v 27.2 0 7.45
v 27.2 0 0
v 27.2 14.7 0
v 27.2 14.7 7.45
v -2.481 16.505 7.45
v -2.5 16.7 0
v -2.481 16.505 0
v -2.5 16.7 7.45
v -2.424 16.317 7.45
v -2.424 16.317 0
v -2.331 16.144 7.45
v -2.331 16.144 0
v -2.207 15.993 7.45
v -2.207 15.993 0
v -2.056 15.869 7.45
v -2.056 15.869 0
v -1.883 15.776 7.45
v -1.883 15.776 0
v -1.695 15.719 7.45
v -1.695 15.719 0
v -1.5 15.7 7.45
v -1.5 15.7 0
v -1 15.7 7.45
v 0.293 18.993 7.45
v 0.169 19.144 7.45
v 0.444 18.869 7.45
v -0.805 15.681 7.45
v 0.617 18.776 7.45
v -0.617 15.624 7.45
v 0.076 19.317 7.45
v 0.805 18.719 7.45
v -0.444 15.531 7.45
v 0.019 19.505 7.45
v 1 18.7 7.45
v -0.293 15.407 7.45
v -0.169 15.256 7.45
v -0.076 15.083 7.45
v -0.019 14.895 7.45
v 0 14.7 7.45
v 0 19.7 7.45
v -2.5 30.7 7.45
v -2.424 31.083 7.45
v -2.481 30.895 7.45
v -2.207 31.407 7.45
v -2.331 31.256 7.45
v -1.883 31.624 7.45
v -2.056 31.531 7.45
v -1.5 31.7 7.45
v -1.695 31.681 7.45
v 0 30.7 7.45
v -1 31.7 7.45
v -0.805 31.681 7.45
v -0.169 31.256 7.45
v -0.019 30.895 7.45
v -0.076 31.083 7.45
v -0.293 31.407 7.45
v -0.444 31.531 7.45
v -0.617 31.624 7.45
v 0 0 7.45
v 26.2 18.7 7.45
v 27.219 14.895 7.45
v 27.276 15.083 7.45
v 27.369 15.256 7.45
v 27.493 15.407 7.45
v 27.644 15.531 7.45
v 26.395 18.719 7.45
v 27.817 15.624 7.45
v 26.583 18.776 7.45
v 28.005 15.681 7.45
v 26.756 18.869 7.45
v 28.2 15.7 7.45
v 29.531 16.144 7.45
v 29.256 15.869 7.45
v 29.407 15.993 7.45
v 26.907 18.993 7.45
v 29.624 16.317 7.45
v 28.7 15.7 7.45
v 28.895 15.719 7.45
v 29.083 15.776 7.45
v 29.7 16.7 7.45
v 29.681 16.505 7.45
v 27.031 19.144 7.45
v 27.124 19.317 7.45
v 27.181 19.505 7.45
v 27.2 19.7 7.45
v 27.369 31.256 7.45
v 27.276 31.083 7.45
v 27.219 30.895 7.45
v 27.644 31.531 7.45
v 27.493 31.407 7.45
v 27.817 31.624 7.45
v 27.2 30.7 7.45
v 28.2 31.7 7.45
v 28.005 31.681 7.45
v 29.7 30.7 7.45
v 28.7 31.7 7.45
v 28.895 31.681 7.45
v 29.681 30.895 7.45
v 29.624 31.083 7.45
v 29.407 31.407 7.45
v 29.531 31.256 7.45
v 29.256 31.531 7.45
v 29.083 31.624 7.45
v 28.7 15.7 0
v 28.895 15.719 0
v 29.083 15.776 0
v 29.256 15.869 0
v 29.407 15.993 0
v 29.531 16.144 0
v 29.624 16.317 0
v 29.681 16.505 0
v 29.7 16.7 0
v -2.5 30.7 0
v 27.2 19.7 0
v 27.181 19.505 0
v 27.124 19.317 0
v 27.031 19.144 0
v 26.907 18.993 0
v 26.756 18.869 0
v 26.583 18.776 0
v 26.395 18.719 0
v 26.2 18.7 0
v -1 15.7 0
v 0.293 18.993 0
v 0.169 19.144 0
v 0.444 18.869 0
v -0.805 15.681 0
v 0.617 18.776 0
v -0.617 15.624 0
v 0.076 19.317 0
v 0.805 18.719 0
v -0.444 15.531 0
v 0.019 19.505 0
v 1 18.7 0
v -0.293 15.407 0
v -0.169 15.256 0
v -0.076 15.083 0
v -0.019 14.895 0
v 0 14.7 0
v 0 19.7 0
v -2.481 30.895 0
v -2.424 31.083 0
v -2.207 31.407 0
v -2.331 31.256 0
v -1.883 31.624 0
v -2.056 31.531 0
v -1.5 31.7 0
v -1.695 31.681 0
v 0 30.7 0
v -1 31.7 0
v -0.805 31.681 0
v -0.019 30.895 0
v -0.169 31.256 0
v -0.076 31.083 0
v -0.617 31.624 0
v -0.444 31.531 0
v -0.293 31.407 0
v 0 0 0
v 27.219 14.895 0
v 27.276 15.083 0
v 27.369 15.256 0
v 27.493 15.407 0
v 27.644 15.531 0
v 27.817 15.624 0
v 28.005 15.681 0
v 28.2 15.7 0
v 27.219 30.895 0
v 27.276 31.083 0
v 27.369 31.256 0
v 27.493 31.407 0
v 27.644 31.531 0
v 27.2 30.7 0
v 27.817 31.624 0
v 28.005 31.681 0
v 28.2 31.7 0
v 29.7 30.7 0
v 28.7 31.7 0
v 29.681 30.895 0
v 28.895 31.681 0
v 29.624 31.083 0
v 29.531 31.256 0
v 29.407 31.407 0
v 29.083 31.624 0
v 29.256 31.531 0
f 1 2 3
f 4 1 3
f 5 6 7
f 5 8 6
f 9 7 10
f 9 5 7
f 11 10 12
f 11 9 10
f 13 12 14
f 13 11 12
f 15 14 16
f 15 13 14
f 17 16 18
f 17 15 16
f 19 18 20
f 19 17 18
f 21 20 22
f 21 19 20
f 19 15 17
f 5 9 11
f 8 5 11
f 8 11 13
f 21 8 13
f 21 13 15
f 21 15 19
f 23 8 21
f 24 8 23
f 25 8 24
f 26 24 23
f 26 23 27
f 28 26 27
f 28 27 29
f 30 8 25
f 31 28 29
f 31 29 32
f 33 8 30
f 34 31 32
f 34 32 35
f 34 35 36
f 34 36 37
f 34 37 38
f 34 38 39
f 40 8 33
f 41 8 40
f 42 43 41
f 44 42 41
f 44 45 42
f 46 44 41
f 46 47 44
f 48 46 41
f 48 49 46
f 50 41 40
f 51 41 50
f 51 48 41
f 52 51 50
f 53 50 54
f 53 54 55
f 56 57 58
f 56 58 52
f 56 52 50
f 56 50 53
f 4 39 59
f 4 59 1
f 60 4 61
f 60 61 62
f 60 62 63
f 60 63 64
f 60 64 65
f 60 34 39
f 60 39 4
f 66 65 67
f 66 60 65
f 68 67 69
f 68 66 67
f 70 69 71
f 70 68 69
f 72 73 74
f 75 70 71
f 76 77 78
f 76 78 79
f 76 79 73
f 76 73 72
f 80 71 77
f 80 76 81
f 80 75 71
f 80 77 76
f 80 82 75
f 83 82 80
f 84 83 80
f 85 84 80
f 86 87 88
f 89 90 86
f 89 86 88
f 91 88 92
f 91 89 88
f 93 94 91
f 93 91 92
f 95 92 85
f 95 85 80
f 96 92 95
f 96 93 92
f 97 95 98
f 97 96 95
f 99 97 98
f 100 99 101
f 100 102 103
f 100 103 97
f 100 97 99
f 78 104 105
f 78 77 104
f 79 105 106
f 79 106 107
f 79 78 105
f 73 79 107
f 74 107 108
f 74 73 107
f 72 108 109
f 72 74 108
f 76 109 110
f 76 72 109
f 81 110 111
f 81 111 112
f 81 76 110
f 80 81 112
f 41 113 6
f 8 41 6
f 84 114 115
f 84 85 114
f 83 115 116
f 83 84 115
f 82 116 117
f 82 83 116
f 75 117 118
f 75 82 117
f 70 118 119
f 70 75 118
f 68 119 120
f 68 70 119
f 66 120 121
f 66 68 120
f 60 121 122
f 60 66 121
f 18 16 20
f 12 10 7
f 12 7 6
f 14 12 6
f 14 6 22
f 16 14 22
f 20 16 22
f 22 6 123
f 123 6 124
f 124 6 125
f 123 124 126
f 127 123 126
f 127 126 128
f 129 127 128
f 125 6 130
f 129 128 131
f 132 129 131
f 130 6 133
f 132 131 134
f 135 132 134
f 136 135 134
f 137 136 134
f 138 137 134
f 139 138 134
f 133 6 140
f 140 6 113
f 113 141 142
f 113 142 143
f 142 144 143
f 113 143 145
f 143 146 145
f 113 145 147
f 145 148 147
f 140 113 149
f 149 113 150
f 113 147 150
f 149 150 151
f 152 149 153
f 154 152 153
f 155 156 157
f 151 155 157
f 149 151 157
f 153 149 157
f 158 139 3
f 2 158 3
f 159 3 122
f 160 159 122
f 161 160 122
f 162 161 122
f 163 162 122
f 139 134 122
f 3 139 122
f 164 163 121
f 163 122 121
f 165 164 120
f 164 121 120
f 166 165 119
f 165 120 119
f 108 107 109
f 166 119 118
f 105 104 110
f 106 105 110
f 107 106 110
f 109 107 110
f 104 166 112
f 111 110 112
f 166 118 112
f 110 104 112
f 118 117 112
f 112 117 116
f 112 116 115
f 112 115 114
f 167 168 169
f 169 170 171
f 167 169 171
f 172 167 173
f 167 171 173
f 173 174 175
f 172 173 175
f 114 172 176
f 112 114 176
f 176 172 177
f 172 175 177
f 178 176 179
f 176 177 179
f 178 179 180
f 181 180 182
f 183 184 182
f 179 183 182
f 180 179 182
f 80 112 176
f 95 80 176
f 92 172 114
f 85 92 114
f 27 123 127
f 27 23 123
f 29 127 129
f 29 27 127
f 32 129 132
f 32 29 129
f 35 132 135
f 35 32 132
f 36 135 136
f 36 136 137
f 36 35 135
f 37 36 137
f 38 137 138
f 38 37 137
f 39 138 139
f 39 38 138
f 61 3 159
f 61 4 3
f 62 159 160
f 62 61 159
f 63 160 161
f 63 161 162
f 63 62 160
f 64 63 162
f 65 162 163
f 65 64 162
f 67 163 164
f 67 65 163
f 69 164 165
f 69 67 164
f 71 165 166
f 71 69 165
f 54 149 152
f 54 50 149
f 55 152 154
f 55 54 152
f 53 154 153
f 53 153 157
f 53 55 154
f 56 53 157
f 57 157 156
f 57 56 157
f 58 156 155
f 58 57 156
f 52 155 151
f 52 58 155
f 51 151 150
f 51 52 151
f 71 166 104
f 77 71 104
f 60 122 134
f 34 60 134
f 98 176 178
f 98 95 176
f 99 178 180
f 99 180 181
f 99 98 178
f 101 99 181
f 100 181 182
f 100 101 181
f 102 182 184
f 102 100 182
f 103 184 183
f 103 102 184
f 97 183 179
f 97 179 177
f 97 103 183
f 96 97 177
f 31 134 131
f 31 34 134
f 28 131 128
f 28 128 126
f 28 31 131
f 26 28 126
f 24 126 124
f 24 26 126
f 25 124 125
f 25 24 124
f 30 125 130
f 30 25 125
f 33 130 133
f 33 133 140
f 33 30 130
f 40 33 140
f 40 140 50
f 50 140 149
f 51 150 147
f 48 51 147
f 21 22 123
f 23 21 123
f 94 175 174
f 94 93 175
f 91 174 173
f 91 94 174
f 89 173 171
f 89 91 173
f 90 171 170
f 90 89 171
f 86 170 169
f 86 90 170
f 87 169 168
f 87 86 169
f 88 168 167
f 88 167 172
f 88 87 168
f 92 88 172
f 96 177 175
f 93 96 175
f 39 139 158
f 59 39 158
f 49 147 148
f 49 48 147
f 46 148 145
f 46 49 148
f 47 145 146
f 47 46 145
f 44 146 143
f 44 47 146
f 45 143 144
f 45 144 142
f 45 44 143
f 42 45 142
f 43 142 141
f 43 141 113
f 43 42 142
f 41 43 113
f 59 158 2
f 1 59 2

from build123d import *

# Parameters (mm, degrees)
PAD_DEPTH = 7.45
FILLET_R  = 1


with BuildPart() as part:
    # Sketch → Pad (new body)
    with BuildSketch(Plane.XY):
        Polygon((0, 0), (27.2, 0), (27.2, 15.7), (29.7, 15.7), (29.7, 31.7), (27.2, 31.7), (27.2, 18.7), (0, 18.7), (0, 31.7), (-2.5, 31.7), (-2.5, 15.7), (0, 15.7), align=None)
    extrude(amount=PAD_DEPTH)

    # Fillet
    fillet_edges = [part.edges().sort_by_distance(p)[0] for p in [
        (0, 18.7, 3.725),
        (0, 31.7, 3.725),
        (-2.5, 31.7, 3.725),
        (27.2, 31.7, 3.725),
        (29.7, 31.7, 3.725),
        (29.7, 15.7, 3.725),
        (27.2, 18.7, 3.725),
        (-2.5, 15.7, 3.725),
        (0, 15.7, 3.725),
        (27.2, 15.7, 3.725),
    ]]
    fillet(fillet_edges, radius=FILLET_R)


solid = part.part
